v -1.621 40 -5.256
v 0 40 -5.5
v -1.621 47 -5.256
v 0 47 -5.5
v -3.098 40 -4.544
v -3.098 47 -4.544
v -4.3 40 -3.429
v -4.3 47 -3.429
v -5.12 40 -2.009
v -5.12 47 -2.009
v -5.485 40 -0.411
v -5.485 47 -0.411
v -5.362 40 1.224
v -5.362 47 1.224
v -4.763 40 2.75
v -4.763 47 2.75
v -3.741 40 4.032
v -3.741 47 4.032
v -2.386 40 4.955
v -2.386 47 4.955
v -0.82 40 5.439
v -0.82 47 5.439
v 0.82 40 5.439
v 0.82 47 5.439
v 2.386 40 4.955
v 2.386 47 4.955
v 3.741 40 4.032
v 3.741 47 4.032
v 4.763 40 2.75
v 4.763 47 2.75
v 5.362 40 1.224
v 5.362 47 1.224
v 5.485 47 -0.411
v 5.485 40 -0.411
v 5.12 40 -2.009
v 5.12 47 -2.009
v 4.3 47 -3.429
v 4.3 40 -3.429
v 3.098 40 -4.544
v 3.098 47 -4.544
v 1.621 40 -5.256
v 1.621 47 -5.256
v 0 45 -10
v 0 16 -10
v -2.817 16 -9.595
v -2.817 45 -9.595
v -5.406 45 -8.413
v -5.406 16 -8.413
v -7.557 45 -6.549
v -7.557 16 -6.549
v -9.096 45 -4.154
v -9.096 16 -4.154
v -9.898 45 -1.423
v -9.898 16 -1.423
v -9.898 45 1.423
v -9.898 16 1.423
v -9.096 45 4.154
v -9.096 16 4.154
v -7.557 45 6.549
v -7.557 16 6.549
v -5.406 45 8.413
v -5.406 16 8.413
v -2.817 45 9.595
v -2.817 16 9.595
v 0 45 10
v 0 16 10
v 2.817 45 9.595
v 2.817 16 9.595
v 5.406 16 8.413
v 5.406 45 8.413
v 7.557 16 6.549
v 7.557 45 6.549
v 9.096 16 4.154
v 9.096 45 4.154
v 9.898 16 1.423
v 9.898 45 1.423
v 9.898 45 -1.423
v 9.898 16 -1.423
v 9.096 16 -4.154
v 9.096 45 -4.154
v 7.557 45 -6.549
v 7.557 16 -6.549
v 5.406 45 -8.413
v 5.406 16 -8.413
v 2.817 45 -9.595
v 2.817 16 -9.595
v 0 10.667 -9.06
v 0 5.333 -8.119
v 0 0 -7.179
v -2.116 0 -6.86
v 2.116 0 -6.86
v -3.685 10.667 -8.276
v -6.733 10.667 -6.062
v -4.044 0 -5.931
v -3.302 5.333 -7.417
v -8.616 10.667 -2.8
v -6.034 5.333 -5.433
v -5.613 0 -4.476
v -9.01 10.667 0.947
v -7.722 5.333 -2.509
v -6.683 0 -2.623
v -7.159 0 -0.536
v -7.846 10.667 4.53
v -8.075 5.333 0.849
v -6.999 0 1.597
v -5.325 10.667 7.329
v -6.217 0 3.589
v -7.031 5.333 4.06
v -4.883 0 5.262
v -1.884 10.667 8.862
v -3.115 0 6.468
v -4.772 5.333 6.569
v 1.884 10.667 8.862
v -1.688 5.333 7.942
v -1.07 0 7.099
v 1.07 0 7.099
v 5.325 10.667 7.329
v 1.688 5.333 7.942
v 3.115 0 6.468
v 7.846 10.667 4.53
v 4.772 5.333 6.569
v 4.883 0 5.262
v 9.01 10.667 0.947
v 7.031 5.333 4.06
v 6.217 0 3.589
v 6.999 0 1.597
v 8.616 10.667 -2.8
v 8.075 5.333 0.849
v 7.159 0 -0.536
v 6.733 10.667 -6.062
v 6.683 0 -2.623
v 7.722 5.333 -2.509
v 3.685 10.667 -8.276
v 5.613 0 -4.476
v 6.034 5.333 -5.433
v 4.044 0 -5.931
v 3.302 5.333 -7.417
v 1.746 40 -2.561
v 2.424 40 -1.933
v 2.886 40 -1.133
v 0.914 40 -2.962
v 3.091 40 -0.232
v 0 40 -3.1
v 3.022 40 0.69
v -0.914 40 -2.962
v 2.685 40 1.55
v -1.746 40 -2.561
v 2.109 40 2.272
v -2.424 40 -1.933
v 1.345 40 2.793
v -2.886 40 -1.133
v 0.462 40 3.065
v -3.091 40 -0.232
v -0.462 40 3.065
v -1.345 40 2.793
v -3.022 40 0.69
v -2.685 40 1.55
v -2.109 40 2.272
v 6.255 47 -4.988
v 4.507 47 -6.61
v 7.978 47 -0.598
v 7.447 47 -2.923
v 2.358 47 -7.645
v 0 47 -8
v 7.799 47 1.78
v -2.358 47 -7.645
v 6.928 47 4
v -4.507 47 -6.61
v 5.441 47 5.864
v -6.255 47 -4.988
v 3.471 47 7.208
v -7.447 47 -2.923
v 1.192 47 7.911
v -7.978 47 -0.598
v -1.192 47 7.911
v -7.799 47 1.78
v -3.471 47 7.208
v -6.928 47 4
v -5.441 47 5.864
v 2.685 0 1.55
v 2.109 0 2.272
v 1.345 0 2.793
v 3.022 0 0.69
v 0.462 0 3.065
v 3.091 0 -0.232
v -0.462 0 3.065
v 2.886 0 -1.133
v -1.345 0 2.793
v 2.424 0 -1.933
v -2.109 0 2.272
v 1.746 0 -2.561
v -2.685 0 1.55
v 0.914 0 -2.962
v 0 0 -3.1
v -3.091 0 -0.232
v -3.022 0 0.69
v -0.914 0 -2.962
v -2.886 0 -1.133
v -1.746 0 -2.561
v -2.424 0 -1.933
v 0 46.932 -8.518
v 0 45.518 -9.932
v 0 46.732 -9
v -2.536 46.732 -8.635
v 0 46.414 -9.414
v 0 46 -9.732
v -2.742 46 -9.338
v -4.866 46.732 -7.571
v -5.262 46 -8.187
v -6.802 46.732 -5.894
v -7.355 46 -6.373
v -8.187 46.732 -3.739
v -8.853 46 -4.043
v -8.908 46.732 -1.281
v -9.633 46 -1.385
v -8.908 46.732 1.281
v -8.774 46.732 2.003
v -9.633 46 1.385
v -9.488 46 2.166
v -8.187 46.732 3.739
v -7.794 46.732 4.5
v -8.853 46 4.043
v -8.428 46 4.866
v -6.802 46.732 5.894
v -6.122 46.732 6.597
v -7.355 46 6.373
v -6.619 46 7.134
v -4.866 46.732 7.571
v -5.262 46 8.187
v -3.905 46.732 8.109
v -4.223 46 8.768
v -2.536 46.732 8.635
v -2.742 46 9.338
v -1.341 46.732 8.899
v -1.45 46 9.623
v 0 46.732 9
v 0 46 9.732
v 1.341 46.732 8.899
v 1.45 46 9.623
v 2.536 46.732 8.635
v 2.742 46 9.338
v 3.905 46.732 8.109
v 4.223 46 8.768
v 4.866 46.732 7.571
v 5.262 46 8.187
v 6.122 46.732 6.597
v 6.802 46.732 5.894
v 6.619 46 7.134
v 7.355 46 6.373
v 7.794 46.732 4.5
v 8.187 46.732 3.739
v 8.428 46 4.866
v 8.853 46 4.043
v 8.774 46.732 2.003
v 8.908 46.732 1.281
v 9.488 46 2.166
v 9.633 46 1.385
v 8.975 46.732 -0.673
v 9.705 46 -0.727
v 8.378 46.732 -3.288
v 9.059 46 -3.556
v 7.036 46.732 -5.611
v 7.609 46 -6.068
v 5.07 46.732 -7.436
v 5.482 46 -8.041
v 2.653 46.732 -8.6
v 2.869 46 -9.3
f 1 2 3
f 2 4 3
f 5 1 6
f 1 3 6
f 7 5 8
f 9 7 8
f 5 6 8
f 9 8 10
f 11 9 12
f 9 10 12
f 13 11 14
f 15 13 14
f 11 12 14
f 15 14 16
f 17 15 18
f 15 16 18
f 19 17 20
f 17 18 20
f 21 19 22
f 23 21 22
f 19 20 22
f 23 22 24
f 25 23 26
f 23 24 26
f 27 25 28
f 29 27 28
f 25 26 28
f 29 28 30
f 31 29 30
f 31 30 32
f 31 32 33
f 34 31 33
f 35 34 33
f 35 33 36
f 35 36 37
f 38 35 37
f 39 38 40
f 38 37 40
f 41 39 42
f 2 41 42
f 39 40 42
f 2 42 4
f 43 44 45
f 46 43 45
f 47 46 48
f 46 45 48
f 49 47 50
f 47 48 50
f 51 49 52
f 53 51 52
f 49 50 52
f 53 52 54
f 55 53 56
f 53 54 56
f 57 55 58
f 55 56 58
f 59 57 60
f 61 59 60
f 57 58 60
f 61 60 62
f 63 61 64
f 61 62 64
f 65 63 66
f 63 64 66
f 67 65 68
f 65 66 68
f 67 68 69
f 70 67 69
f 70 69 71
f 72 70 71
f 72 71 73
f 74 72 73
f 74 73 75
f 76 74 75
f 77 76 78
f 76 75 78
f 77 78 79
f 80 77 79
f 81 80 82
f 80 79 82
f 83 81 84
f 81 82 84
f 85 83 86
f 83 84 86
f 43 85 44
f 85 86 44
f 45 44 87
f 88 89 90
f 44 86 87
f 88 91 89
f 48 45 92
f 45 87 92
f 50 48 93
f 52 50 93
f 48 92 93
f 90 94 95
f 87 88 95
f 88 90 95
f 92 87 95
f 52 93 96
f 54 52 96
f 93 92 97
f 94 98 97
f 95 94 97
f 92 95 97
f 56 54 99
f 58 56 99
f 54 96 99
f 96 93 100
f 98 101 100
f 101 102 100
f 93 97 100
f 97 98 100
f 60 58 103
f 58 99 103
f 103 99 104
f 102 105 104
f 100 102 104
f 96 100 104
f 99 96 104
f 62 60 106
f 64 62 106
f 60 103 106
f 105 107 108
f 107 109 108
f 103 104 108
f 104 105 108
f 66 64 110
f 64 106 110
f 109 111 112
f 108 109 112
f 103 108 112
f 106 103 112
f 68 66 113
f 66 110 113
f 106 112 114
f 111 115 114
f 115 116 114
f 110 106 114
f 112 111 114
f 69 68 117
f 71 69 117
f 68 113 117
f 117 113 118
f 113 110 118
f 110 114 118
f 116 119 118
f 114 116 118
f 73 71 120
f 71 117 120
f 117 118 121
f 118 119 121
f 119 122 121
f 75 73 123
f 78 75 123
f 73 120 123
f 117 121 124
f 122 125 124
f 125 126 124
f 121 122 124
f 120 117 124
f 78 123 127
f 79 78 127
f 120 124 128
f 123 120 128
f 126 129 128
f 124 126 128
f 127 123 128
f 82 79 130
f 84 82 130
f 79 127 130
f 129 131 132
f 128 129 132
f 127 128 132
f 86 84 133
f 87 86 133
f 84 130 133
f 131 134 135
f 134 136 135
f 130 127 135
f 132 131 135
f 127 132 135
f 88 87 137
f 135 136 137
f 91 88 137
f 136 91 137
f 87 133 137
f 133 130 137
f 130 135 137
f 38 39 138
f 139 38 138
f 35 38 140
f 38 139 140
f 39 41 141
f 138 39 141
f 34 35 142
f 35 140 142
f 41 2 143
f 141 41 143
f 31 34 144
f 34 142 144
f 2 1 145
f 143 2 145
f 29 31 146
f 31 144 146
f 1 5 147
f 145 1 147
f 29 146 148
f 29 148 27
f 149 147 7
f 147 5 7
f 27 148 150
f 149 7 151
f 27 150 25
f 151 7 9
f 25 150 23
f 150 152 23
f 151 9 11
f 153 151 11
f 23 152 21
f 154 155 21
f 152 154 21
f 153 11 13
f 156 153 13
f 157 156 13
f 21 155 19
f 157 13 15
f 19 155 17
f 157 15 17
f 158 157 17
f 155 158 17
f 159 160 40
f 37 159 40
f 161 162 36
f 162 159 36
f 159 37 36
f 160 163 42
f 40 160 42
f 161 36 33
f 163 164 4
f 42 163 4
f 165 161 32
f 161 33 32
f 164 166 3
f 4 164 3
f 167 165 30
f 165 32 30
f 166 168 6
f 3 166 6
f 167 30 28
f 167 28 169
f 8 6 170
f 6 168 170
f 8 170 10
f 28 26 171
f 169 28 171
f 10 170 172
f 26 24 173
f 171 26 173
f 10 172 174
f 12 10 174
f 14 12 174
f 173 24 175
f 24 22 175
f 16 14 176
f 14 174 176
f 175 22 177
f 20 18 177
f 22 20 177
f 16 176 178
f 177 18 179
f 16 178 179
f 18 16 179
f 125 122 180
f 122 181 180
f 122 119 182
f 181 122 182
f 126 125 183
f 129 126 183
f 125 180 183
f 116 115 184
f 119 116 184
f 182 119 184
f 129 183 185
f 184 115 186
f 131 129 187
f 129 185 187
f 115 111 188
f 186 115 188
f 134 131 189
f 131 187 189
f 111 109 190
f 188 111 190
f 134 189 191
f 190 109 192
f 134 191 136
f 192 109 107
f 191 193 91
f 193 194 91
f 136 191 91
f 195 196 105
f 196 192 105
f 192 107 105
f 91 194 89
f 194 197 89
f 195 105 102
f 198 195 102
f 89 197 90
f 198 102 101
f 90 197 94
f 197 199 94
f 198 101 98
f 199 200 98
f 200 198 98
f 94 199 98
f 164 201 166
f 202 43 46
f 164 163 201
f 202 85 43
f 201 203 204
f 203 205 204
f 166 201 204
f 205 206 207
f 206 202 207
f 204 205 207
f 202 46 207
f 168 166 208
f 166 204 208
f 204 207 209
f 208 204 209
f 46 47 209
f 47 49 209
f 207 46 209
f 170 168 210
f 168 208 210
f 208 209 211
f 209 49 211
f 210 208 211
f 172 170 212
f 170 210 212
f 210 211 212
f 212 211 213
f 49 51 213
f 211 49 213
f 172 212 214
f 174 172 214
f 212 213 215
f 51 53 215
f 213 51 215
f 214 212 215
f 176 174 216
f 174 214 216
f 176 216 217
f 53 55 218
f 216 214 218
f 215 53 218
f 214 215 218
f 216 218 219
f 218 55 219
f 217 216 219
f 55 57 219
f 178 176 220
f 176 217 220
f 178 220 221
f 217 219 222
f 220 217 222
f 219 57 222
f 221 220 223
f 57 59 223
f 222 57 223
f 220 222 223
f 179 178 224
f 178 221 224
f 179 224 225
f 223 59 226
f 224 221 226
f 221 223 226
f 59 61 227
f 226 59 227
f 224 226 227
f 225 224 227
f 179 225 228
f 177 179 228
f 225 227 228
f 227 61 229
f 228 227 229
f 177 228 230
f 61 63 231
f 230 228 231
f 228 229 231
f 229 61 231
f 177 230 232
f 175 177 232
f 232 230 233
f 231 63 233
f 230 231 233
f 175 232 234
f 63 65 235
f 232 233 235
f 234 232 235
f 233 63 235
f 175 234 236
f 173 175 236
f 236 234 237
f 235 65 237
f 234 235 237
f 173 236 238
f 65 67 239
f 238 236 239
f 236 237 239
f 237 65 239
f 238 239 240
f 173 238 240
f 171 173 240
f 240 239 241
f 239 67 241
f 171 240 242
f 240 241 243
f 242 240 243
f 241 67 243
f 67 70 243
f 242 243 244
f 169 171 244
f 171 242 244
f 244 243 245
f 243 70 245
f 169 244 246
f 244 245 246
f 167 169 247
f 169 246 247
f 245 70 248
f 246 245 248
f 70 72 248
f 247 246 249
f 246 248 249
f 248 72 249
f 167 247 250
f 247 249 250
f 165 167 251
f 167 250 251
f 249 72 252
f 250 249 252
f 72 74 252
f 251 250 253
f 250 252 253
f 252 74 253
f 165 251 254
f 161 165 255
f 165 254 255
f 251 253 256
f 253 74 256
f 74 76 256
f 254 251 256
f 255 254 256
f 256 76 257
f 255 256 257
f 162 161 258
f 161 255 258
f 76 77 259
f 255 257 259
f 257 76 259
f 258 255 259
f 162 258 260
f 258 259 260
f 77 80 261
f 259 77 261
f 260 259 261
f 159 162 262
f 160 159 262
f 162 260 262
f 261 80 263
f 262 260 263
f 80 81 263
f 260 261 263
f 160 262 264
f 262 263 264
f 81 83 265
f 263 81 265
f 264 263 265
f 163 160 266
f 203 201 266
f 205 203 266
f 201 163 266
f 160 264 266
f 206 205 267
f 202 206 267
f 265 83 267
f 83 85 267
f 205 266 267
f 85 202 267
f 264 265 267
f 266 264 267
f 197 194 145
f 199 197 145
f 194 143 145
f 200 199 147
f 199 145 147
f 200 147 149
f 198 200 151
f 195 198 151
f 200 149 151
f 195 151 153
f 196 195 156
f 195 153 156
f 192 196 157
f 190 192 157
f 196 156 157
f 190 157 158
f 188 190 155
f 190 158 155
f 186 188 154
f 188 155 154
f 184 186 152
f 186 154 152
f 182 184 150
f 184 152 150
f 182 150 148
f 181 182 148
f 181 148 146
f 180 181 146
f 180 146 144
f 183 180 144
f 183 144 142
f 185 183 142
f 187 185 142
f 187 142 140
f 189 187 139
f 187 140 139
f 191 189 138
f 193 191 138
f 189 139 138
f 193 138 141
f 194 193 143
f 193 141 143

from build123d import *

# Parameters (mm, degrees)
CONG_1_R = 2


with BuildPart() as part:
    # Esquisse1 → Révolution1 (revolve)
    with BuildSketch(Plane.XY, mode=Mode.PRIVATE) as r_volution1_sk:
        Polygon((3.1, 0), (3.1, 40), (5.5, 40), (5.5, 47), (10, 47), (10, 16), (7.178768309, 0), align=None)
    revolve(r_volution1_sk.sketch.rotate(Axis((0, 0, 0), (0, 1, 0)), 90), axis=Axis((0, 0, 0), (0, 1, 0)))

    # Congé1
    cong_1_edges = [part.edges().sort_by_distance(p)[0] for p in [
        (0, 47, 10),
    ]]
    fillet(cong_1_edges, radius=CONG_1_R)


solid = part.part
